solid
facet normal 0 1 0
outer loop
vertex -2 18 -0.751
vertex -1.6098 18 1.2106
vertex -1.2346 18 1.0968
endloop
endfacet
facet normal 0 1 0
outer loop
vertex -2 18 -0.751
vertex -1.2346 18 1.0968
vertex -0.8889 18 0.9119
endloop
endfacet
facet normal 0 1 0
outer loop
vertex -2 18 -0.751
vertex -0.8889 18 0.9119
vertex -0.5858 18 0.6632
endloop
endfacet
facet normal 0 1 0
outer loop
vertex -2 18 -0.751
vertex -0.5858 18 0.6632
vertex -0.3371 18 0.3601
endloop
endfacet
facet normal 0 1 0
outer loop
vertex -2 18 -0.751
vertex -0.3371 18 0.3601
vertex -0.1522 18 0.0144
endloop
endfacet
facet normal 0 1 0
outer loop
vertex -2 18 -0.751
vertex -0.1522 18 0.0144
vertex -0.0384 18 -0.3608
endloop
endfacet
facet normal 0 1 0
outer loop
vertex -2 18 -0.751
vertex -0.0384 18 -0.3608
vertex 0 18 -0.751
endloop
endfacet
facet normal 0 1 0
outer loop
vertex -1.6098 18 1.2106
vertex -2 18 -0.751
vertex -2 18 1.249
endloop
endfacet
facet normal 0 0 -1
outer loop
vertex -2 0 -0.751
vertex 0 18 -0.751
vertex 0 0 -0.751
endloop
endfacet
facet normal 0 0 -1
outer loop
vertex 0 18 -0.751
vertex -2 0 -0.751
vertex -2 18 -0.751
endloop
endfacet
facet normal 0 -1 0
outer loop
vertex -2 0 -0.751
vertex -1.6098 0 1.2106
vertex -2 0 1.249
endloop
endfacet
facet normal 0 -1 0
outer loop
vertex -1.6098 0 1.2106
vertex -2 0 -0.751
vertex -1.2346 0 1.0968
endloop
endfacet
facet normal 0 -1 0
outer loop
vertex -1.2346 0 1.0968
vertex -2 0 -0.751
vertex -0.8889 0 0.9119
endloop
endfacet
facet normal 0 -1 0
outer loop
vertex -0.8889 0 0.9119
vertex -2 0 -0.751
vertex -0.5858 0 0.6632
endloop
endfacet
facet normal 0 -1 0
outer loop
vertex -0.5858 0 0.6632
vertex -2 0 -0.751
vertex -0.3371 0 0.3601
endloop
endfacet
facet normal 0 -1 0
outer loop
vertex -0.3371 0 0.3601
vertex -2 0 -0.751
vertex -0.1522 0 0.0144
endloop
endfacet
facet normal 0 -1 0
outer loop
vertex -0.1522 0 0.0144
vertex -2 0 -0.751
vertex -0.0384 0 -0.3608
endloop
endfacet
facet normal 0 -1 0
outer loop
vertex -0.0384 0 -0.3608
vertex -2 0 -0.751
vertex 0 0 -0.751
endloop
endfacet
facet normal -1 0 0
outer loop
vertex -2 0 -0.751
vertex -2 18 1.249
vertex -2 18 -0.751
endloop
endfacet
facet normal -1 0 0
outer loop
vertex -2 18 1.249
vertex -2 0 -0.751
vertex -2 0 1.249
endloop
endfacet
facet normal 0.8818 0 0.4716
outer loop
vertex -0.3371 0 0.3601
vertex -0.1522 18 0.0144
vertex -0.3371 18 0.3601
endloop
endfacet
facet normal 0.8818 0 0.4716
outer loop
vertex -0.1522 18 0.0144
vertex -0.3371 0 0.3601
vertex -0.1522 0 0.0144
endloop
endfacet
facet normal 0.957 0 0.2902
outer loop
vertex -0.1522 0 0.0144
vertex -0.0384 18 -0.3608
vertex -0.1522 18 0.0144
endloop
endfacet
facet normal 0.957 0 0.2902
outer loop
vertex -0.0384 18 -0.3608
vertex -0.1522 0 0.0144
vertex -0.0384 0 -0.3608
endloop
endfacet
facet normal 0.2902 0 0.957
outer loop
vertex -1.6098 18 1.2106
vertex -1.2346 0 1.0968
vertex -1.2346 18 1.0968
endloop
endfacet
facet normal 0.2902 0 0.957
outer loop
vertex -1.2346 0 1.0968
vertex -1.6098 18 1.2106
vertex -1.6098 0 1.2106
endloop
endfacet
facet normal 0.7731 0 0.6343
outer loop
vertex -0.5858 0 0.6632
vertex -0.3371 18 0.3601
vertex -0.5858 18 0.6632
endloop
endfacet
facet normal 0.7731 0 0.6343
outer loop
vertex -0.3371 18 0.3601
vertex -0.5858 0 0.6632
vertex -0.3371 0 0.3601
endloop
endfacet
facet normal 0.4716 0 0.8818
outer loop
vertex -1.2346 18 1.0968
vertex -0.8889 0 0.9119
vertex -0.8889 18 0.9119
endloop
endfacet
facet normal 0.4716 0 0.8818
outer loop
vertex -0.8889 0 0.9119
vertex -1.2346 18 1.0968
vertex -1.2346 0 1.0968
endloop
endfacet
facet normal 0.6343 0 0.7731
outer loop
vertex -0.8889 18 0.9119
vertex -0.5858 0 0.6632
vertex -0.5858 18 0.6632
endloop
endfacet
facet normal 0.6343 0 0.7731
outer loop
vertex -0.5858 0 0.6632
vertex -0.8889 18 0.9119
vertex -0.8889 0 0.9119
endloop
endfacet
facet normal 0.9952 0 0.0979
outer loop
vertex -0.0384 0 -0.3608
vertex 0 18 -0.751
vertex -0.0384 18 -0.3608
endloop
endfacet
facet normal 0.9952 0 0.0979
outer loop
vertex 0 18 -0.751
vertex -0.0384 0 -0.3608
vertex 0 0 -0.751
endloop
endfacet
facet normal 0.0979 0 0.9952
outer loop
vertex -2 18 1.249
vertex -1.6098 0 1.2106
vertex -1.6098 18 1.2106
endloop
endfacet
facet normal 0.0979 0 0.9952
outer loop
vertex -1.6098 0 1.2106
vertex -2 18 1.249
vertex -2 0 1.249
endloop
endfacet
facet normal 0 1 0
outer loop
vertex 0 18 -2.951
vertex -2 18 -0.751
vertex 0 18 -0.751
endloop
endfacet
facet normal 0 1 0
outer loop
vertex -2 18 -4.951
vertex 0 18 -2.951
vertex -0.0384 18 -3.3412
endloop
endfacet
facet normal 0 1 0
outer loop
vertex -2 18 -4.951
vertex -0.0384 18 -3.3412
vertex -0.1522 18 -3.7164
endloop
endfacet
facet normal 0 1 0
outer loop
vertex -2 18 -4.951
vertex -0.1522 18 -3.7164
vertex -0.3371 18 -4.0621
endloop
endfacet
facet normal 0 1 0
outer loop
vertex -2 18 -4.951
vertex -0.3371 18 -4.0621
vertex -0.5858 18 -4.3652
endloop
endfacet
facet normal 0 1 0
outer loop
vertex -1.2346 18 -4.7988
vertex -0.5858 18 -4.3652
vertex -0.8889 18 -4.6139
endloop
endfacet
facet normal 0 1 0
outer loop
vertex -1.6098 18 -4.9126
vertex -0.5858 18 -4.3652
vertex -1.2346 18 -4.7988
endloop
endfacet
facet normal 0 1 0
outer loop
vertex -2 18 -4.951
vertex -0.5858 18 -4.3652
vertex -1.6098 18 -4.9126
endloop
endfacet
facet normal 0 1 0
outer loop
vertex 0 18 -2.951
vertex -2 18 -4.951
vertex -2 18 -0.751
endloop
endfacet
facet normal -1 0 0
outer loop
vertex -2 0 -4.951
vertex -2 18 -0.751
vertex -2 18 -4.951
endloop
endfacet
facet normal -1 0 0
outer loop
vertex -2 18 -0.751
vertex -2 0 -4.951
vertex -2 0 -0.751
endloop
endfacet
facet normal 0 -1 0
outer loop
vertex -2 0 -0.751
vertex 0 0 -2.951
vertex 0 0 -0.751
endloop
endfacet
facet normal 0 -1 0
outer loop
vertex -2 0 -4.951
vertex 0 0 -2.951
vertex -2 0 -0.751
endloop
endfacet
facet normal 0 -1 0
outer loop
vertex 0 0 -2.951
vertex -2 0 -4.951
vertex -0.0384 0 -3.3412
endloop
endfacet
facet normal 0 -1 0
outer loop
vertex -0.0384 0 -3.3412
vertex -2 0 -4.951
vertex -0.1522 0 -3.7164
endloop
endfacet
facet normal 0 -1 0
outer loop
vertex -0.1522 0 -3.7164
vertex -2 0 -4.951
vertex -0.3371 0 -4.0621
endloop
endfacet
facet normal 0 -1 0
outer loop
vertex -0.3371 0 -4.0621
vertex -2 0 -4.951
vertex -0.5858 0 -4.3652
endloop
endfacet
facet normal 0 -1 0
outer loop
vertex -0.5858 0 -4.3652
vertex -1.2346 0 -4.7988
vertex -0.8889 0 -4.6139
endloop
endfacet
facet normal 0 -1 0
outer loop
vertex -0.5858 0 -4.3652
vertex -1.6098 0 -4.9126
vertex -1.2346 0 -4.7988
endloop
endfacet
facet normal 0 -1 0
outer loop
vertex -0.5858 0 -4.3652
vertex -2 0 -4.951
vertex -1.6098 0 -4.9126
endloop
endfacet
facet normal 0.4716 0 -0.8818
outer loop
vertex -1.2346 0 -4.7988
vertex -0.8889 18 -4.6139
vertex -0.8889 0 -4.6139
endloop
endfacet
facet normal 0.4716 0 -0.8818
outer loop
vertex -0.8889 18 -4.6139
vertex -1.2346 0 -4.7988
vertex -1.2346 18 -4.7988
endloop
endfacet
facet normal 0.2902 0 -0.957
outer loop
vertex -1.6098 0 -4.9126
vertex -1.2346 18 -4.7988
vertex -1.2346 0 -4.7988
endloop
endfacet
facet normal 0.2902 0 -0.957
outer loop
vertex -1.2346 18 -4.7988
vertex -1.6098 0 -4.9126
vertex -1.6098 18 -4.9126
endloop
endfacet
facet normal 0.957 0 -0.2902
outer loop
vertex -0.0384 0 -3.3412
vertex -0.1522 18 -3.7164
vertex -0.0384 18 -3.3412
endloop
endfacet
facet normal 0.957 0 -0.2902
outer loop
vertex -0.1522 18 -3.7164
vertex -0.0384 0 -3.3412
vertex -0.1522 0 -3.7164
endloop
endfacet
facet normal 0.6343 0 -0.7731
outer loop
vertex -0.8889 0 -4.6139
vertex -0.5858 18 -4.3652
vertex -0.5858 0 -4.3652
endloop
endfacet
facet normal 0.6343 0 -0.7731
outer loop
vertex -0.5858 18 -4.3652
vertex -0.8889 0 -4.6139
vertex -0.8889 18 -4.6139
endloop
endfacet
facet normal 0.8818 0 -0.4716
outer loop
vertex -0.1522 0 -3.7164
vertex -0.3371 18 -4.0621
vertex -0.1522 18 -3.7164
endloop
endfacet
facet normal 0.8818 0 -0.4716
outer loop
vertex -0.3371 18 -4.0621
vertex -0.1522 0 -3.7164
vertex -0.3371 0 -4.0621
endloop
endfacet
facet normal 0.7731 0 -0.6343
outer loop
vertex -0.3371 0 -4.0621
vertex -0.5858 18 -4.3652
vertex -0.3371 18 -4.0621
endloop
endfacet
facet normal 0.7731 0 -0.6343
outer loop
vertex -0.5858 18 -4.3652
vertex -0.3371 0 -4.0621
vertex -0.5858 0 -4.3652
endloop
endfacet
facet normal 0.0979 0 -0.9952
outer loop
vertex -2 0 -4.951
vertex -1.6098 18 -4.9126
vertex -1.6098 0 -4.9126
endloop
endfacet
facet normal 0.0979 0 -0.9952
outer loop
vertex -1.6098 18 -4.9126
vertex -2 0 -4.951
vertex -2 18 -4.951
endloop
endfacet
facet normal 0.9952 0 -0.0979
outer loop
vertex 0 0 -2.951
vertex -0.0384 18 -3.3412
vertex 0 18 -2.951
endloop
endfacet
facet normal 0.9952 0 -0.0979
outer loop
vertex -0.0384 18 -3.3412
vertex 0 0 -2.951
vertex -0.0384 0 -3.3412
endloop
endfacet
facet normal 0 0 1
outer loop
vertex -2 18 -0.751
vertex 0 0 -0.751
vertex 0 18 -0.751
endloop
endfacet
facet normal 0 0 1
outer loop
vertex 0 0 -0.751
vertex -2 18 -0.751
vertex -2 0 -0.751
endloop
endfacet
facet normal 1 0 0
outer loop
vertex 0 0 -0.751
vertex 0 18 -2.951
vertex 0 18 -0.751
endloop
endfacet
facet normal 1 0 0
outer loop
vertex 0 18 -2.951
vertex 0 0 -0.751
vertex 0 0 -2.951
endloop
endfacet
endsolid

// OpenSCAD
// special openscad variables
$fn = 32;

// Plate slack variables:
plate_slack = 0.05;
plate_depth_slack = 0.05;

// Hotswap slack variables:
width_padding = 0.25;
height_padding = 0.25;
exit_padding = 0.5;
ledge_width = 0.5;

hotswap_height_slack = 0;

// 3 mid plate hole radius:
center_radius_slack = 0.35;
sides_radius_slack = 0.25;

// wire lanes variables

lane_width = 1.6;
move_fraction = 2.85;

columns = 5; // zero indexed so 5 for 6 and 4 for 5
two_key_last_column = true; // might use for setting last row to be with or without key
stagger = [0, 2, 8, 2, -7, -7]; // max difference between neigbour columns is 9mm 



// side: 0 = top; 1 = right; 2 = bottom; 3 = left;
module edge(length, side){
    roate_deg = 90;
    translate_list = [0, 0, 0];
    
    translate(translate_list)
    rotate(roate_deg)
    translate([0, 0, -3.001 - hotswap_height_slack - 0.9 - plate_depth_slack])
    union(){
        translate([0, 0, 3.2])
        intersection(){
            cube([length, 2, 2]);
            translate([0, 2, 0])
            rotate([0, 90, 0])
            cylinder(h=length, r=2);
        }


        translate([0, 0, 1])
        cube([length, 2, 2.2]);

        translate([0, 2, -1])
        rotate([90, 0, 0])
        intersection(){
            cube([length, 2, 2]);
            translate([0, 2, 0])
            rotate([0, 90, 0])
            cylinder(h=length, r=2);
        }
    }
}


edge(18, 3);
